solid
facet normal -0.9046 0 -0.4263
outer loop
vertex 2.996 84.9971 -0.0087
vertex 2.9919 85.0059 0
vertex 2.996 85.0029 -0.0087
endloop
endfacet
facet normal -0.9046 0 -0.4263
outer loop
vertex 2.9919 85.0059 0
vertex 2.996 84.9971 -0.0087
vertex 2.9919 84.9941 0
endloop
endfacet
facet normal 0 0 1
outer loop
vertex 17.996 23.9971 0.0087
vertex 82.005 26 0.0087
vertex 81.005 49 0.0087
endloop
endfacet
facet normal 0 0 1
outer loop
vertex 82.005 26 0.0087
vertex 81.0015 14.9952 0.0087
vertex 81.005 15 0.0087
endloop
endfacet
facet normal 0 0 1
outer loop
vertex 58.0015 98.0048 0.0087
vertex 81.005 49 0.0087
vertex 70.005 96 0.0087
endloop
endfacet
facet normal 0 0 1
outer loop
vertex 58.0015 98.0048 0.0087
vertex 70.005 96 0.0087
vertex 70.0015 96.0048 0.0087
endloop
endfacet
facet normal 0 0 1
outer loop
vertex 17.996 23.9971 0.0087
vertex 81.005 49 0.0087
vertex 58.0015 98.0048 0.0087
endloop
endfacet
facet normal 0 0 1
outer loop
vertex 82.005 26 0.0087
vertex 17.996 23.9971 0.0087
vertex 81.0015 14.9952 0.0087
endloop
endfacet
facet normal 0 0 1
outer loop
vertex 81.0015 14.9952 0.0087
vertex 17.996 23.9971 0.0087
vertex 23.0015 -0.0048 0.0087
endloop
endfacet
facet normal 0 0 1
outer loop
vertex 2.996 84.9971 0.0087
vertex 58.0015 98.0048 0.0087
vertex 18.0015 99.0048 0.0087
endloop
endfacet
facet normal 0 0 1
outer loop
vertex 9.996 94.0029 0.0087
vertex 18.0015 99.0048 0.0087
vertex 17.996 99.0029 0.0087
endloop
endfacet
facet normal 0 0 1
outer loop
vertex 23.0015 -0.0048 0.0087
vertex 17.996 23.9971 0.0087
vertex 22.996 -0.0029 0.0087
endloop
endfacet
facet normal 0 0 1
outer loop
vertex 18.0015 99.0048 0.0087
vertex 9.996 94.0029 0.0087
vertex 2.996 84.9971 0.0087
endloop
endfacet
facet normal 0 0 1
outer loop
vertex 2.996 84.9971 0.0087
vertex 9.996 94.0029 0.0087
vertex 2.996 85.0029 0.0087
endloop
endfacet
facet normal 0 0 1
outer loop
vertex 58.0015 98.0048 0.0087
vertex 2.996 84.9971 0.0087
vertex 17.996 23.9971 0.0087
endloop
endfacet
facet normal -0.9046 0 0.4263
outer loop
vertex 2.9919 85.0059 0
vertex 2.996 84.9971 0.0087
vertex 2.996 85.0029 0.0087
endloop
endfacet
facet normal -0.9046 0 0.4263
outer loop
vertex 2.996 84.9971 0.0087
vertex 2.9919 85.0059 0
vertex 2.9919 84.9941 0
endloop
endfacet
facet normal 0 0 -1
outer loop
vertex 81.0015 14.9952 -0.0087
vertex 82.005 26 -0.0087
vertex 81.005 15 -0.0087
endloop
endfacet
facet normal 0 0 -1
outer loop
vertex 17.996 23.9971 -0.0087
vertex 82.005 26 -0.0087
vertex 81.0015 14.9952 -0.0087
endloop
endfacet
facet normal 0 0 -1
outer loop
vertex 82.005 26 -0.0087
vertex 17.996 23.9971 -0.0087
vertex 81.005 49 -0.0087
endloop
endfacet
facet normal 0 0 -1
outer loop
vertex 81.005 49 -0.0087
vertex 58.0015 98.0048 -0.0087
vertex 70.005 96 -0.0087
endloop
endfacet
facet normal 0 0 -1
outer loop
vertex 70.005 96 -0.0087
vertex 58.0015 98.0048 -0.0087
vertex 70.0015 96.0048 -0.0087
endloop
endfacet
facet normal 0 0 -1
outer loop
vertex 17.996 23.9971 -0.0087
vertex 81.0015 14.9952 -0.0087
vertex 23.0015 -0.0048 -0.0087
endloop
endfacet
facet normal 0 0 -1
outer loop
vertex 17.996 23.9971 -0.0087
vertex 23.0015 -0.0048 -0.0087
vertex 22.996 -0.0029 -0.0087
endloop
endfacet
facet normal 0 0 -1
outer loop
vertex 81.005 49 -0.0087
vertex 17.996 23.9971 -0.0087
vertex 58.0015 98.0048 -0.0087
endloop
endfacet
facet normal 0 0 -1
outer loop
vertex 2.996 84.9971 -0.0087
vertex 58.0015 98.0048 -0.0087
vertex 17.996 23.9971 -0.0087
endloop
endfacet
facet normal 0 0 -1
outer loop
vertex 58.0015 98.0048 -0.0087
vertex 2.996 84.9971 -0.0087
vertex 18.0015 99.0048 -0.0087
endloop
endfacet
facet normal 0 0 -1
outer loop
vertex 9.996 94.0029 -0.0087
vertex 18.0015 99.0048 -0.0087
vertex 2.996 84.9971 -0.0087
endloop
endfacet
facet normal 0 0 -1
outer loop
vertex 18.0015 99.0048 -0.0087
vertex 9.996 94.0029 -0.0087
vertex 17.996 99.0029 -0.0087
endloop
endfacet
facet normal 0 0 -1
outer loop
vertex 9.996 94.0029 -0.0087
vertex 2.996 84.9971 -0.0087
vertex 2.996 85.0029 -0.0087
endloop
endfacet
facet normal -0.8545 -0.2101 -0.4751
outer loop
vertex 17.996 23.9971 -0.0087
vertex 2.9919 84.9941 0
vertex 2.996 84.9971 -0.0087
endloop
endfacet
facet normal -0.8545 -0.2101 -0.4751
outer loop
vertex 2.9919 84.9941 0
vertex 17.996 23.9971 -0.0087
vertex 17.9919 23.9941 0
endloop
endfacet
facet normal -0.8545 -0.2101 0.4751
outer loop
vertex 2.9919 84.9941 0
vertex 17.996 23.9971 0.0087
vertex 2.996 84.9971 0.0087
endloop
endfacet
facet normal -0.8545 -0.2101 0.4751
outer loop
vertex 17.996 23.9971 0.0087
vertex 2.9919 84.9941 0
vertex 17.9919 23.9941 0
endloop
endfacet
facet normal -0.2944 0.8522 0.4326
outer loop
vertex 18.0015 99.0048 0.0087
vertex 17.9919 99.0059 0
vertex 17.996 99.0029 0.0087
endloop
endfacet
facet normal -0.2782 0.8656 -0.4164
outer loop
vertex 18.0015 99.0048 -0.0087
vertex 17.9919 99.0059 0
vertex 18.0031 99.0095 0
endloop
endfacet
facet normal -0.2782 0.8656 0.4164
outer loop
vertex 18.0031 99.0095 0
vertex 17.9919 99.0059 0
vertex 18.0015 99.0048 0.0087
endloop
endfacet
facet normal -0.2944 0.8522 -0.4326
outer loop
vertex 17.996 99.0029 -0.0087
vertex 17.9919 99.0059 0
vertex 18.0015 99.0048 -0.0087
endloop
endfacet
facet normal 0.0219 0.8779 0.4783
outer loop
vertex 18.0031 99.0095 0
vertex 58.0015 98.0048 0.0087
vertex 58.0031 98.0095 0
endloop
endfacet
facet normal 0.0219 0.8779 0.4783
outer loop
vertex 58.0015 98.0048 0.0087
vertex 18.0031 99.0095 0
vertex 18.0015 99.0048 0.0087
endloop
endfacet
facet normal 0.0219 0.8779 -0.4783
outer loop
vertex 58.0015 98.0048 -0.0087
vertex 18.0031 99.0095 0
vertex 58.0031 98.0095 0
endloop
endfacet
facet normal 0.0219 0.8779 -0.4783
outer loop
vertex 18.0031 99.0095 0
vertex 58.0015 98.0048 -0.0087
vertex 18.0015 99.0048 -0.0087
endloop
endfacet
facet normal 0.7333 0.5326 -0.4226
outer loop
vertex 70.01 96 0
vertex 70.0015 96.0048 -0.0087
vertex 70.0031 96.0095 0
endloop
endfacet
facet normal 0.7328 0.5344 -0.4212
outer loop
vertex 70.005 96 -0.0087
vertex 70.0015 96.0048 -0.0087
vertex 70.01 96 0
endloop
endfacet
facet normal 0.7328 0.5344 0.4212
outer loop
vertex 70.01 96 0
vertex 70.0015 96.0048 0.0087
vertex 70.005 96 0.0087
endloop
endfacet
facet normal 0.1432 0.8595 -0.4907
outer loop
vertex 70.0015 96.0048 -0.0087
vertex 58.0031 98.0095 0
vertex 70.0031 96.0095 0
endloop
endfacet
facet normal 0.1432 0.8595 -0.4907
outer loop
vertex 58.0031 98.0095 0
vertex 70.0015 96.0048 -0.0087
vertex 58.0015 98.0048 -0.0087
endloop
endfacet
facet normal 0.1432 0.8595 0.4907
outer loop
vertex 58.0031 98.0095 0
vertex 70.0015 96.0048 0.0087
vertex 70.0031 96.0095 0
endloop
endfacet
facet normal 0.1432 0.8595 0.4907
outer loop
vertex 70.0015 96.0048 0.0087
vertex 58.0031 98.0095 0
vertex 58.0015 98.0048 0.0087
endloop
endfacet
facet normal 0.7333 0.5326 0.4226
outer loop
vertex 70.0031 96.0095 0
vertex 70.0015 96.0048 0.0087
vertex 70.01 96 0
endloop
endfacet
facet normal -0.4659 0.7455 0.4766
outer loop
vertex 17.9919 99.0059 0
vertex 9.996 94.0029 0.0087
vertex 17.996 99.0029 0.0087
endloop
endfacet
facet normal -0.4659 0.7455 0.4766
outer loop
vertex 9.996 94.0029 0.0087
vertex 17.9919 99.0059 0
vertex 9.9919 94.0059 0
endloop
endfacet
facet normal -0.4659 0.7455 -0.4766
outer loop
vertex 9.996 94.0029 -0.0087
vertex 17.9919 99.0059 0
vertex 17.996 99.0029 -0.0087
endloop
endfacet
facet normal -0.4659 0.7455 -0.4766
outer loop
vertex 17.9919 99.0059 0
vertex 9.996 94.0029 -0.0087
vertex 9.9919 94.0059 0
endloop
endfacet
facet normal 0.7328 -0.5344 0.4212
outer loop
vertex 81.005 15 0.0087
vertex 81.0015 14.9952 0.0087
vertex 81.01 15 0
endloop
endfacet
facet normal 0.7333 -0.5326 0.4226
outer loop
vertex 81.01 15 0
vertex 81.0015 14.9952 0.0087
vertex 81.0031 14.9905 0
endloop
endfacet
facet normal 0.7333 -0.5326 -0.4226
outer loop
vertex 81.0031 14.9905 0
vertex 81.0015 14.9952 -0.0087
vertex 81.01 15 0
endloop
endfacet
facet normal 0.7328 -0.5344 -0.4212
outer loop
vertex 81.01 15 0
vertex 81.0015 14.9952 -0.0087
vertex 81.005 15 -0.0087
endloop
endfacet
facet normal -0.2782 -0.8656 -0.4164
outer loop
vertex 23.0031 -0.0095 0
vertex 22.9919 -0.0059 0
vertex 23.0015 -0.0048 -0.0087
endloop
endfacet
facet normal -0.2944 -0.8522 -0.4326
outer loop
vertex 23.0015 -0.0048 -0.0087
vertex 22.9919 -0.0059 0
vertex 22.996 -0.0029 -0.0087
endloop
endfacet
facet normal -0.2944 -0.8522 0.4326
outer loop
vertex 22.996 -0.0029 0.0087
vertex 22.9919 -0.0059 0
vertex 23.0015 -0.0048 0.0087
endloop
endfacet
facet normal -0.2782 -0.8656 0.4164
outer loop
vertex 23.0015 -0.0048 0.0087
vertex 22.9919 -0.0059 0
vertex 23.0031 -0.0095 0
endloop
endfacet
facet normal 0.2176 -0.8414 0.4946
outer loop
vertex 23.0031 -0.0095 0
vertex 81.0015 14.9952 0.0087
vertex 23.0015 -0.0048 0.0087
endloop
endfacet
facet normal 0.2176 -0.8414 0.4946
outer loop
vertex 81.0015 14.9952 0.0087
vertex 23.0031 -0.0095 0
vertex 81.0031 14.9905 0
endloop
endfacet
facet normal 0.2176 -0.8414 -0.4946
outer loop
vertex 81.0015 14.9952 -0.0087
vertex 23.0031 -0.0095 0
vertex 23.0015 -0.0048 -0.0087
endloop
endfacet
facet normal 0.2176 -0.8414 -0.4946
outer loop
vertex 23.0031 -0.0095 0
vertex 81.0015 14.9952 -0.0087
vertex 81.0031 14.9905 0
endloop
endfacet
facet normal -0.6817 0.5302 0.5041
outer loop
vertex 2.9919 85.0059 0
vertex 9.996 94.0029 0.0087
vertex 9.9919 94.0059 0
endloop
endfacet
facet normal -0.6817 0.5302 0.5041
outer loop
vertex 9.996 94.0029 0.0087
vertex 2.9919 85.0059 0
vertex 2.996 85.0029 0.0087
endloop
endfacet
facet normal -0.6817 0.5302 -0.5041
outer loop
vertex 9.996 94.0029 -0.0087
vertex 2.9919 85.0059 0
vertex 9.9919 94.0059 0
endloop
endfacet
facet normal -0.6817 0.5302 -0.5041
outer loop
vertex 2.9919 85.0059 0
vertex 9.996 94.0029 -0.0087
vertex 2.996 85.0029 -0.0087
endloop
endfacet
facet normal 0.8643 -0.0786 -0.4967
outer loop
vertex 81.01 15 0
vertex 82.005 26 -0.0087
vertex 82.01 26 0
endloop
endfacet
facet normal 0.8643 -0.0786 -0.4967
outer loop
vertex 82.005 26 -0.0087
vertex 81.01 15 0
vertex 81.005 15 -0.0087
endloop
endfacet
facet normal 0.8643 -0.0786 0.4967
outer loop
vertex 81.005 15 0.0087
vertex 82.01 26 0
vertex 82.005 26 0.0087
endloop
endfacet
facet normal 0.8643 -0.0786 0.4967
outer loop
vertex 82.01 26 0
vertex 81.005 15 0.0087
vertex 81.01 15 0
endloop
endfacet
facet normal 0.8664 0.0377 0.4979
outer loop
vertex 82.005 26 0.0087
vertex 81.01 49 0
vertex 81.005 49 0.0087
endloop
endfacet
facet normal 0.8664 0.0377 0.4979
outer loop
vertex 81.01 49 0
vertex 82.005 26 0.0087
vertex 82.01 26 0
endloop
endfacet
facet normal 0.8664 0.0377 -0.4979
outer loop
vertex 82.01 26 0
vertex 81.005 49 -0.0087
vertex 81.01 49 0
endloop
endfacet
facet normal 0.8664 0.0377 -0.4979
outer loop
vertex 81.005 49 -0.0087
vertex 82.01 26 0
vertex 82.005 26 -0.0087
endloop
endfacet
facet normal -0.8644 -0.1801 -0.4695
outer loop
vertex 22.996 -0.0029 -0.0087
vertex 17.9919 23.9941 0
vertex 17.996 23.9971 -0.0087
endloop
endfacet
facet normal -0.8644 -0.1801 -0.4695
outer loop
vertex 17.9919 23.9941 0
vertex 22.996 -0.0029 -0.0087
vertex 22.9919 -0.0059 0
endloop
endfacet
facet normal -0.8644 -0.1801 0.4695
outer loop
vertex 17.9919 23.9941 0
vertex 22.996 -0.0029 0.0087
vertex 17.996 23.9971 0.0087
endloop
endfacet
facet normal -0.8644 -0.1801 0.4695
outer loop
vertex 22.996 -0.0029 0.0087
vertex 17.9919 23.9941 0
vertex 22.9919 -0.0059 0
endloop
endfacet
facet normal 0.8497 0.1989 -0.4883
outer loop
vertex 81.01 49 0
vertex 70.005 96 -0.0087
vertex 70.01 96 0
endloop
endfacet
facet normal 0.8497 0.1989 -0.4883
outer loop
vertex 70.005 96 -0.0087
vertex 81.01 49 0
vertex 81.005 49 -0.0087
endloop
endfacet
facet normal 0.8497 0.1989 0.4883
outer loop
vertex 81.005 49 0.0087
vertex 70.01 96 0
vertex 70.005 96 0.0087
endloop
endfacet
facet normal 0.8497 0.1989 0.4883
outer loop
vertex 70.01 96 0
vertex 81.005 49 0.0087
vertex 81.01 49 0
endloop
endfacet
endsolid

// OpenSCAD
color([0.5839405385485582,0.4048698908705002,0.6877557316706271]) hull(){
    translate([18,58]) sphere(0.01);
    translate([6,84]) sphere(0.01);
    translate([3,85]) sphere(0.01);
}
color([0.29310936231965135,0.08456113000314536,0.6409271470126323]) hull(){
    translate([18,58]) sphere(0.01);
    translate([6,84]) sphere(0.01);
    translate([16,79]) sphere(0.01);
}
color([0.38512246522478266,0.6162859510128613,0.407224705538046]) hull(){
    translate([18,58]) sphere(0.01);
    translate([18,24]) sphere(0.01);
    translate([26,51]) sphere(0.01);
}
color([0.6107800780239486,0.9541913078580654,0.09369719926319908]) hull(){
    translate([18,58]) sphere(0.01);
    translate([18,24]) sphere(0.01);
    translate([3,85]) sphere(0.01);
}
color([0.4396226851829427,0.9817497074141792,0.30111933510979894]) hull(){
    translate([18,58]) sphere(0.01);
    translate([26,51]) sphere(0.01);
    translate([30,57]) sphere(0.01);
}
color([0.08571041628526821,0.691130580335744,0.16573157374072334]) hull(){
    translate([18,58]) sphere(0.01);
    translate([30,57]) sphere(0.01);
    translate([16,79]) sphere(0.01);
}
color([0.4668304924867862,0.30100213617539295,0.3511677492745029]) hull(){
    translate([58,98]) sphere(0.01);
    translate([50,93]) sphere(0.01);
    translate([39,98]) sphere(0.01);
}
color([0.05564944269037686,0.7696481469448815,0.686275624239137]) hull(){
    translate([58,98]) sphere(0.01);
    translate([50,93]) sphere(0.01);
    translate([59,71]) sphere(0.01);
}
color([0.15447252119296884,0.35335085758162643,0.18799175914388588]) hull(){
    translate([58,98]) sphere(0.01);
    translate([39,98]) sphere(0.01);
    translate([18,99]) sphere(0.01);
}
color([0.41322879780265653,0.82270842281296,0.9057146612667819]) hull(){
    translate([58,98]) sphere(0.01);
    translate([59,71]) sphere(0.01);
    translate([70,96]) sphere(0.01);
}
color([0.9688547633127277,0.5528378273263655,0.12760284187612392]) hull(){
    translate([22,90]) sphere(0.01);
    translate([10,94]) sphere(0.01);
    translate([20,83]) sphere(0.01);
}
color([0.1710979555253146,0.7131998843266452,0.6397779425125977]) hull(){
    translate([22,90]) sphere(0.01);
    translate([10,94]) sphere(0.01);
    translate([18,99]) sphere(0.01);
}
color([0.57496968906483,0.8489371230716904,0.07944838941339594]) hull(){
    translate([22,90]) sphere(0.01);
    translate([39,98]) sphere(0.01);
    translate([20,83]) sphere(0.01);
}
color([0.040333123224873146,0.9305910632054132,0.3080440975445232]) hull(){
    translate([22,90]) sphere(0.01);
    translate([39,98]) sphere(0.01);
    translate([18,99]) sphere(0.01);
}
color([0.6084655882345898,0.4923441190446234,0.7069385087242315]) hull(){
    translate([50,93]) sphere(0.01);
    translate([39,98]) sphere(0.01);
    translate([20,83]) sphere(0.01);
}
color([0.6803385961846494,0.18024793645131376,0.10787678186317007]) hull(){
    translate([50,93]) sphere(0.01);
    translate([59,71]) sphere(0.01);
    translate([20,83]) sphere(0.01);
}
color([0.1335624130282893,0.47731112778056706,0.8393950916733898]) hull(){
    translate([44,55]) sphere(0.01);
    translate([44,47]) sphere(0.01);
    translate([35,48]) sphere(0.01);
}
color([0.6780893207968227,0.08337096158279222,0.27725115680544954]) hull(){
    translate([44,55]) sphere(0.01);
    translate([44,47]) sphere(0.01);
    translate([77,50]) sphere(0.01);
}
color([0.9965791662073833,0.03375154870506614,0.10494976972159242]) hull(){
    translate([44,55]) sphere(0.01);
    translate([59,71]) sphere(0.01);
    translate([77,50]) sphere(0.01);
}
color([0.516844917539197,0.1360610465034362,0.543805910213663]) hull(){
    translate([44,55]) sphere(0.01);
    translate([59,71]) sphere(0.01);
    translate([30,57]) sphere(0.01);
}
color([0.04901628196141694,0.4867102513994055,0.8813892002857401]) hull(){
    translate([44,55]) sphere(0.01);
    translate([35,48]) sphere(0.01);
    translate([30,57]) sphere(0.01);
}
color([0.3053751014353143,0.40772022041766365,0.31297204198076634]) hull(){
    translate([64,14]) sphere(0.01);
    translate([68,15]) sphere(0.01);
    translate([81,15]) sphere(0.01);
}
color([0.49907796034366436,0.6160709555012981,0.9916538905911245]) hull(){
    translate([64,14]) sphere(0.01);
    translate([68,15]) sphere(0.01);
    translate([72,20]) sphere(0.01);
}
color([0.3123575451593331,0.46364206475662195,0.8862899719975306]) hull(){
    translate([64,14]) sphere(0.01);
    translate([58,33]) sphere(0.01);
    translate([42,29]) sphere(0.01);
}
color([0.5738800220993816,0.8494037217359881,0.24323676398212035]) hull(){
    translate([64,14]) sphere(0.01);
    translate([58,33]) sphere(0.01);
    translate([72,20]) sphere(0.01);
}
color([0.8402878098664139,0.9530478541805099,0.16594803365564914]) hull(){
    translate([64,14]) sphere(0.01);
    translate([42,29]) sphere(0.01);
    translate([23,0]) sphere(0.01);
}
color([0.0023370868964924796,0.7387895340607371,0.5374530602666081]) hull(){
    translate([64,14]) sphere(0.01);
    translate([81,15]) sphere(0.01);
    translate([23,0]) sphere(0.01);
}
color([0.25604025835089217,0.4320068924153808,0.5112453323210508]) hull(){
    translate([68,15]) sphere(0.01);
    translate([81,15]) sphere(0.01);
    translate([72,20]) sphere(0.01);
}
color([0.7462272619347637,0.5039790716190428,0.8850839351693509]) hull(){
    translate([10,94]) sphere(0.01);
    translate([6,84]) sphere(0.01);
    translate([20,83]) sphere(0.01);
}
color([0.6652757233710683,0.22263754843686523,0.08942086350367451]) hull(){
    translate([10,94]) sphere(0.01);
    translate([6,84]) sphere(0.01);
    translate([3,85]) sphere(0.01);
}
color([0.6195232841458308,0.9036720387350747,0.7222923954673625]) hull(){
    translate([58,33]) sphere(0.01);
    translate([82,26]) sphere(0.01);
    translate([77,50]) sphere(0.01);
}
color([0.6665075097113882,0.5421139713900744,0.6943978877819516]) hull(){
    translate([58,33]) sphere(0.01);
    translate([82,26]) sphere(0.01);
    translate([72,20]) sphere(0.01);
}
color([0.9269770591996176,0.12480324665016229,0.8422397758241813]) hull(){
    translate([58,33]) sphere(0.01);
    translate([42,29]) sphere(0.01);
    translate([44,47]) sphere(0.01);
}
color([0.028249143050612435,0.8554899328562455,0.6212809598996976]) hull(){
    translate([58,33]) sphere(0.01);
    translate([44,47]) sphere(0.01);
    translate([77,50]) sphere(0.01);
}
color([0.6435486749275994,0.4857227915978113,0.2898251547629681]) hull(){
    translate([6,84]) sphere(0.01);
    translate([20,83]) sphere(0.01);
    translate([16,79]) sphere(0.01);
}
color([0.21709076393122206,0.4979948584580751,0.6176241526046676]) hull(){
    translate([82,26]) sphere(0.01);
    translate([81,15]) sphere(0.01);
    translate([72,20]) sphere(0.01);
}
color([0.4722249532281336,0.7228331534363125,0.6109414561657331]) hull(){
    translate([82,26]) sphere(0.01);
    translate([77,50]) sphere(0.01);
    translate([81,49]) sphere(0.01);
}
color([0.5330085163671737,0.6769359871291822,0.5973748769978083]) hull(){
    translate([42,29]) sphere(0.01);
    translate([26,22]) sphere(0.01);
    translate([35,48]) sphere(0.01);
}
color([0.14460255854654236,0.21273280877313017,0.8417179364881341]) hull(){
    translate([42,29]) sphere(0.01);
    translate([26,22]) sphere(0.01);
    translate([23,0]) sphere(0.01);
}
color([0.6300391880279899,0.5103677782275869,0.4479627161837708]) hull(){
    translate([42,29]) sphere(0.01);
    translate([44,47]) sphere(0.01);
    translate([35,48]) sphere(0.01);
}
color([0.2903518628620462,0.1744676713524972,0.5457372127765215]) hull(){
    translate([26,22]) sphere(0.01);
    translate([18,24]) sphere(0.01);
    translate([26,51]) sphere(0.01);
}
color([0.6340658375422632,0.7004271366493812,0.690956934786038]) hull(){
    translate([26,22]) sphere(0.01);
    translate([18,24]) sphere(0.01);
    translate([24,21]) sphere(0.01);
}
color([0.013948469234104865,0.8018456354370093,0.2607079205191076]) hull(){
    translate([26,22]) sphere(0.01);
    translate([26,51]) sphere(0.01);
    translate([35,48]) sphere(0.01);
}
color([0.01899716010339858,0.7507132946374245,0.44168653561511173]) hull(){
    translate([26,22]) sphere(0.01);
    translate([23,0]) sphere(0.01);
    translate([24,21]) sphere(0.01);
}
color([0.1668653701245908,0.45955837321901094,0.7876756969907556]) hull(){
    translate([18,24]) sphere(0.01);
    translate([23,0]) sphere(0.01);
    translate([24,21]) sphere(0.01);
}
color([0.09564527702692727,0.06733136152719421,0.7816649665975636]) hull(){
    translate([80,52]) sphere(0.01);
    translate([59,71]) sphere(0.01);
    translate([77,50]) sphere(0.01);
}
color([0.030385075649315252,0.33346286891595733,0.08647112242809318]) hull(){
    translate([80,52]) sphere(0.01);
    translate([59,71]) sphere(0.01);
    translate([70,96]) sphere(0.01);
}
color([0.8161439782233904,0.05657658467482607,0.8243668117903717]) hull(){
    translate([80,52]) sphere(0.01);
    translate([77,50]) sphere(0.01);
    translate([81,49]) sphere(0.01);
}
color([0.05808931884644186,0.6181904095369413,0.1426995958976538]) hull(){
    translate([80,52]) sphere(0.01);
    translate([81,49]) sphere(0.01);
    translate([70,96]) sphere(0.01);
}
color([0.3846464495954227,0.3794414211645075,0.7643773332264734]) hull(){
    translate([26,51]) sphere(0.01);
    translate([35,48]) sphere(0.01);
    translate([30,57]) sphere(0.01);
}
color([0.3116889002403487,0.7690158776827113,0.7674729074453902]) hull(){
    translate([59,71]) sphere(0.01);
    translate([20,83]) sphere(0.01);
    translate([30,57]) sphere(0.01);
}
color([0.3394448706328078,0.45855440081433096,0.0007502935671159783]) hull(){
    translate([20,83]) sphere(0.01);
    translate([30,57]) sphere(0.01);
    translate([16,79]) sphere(0.01);
}
